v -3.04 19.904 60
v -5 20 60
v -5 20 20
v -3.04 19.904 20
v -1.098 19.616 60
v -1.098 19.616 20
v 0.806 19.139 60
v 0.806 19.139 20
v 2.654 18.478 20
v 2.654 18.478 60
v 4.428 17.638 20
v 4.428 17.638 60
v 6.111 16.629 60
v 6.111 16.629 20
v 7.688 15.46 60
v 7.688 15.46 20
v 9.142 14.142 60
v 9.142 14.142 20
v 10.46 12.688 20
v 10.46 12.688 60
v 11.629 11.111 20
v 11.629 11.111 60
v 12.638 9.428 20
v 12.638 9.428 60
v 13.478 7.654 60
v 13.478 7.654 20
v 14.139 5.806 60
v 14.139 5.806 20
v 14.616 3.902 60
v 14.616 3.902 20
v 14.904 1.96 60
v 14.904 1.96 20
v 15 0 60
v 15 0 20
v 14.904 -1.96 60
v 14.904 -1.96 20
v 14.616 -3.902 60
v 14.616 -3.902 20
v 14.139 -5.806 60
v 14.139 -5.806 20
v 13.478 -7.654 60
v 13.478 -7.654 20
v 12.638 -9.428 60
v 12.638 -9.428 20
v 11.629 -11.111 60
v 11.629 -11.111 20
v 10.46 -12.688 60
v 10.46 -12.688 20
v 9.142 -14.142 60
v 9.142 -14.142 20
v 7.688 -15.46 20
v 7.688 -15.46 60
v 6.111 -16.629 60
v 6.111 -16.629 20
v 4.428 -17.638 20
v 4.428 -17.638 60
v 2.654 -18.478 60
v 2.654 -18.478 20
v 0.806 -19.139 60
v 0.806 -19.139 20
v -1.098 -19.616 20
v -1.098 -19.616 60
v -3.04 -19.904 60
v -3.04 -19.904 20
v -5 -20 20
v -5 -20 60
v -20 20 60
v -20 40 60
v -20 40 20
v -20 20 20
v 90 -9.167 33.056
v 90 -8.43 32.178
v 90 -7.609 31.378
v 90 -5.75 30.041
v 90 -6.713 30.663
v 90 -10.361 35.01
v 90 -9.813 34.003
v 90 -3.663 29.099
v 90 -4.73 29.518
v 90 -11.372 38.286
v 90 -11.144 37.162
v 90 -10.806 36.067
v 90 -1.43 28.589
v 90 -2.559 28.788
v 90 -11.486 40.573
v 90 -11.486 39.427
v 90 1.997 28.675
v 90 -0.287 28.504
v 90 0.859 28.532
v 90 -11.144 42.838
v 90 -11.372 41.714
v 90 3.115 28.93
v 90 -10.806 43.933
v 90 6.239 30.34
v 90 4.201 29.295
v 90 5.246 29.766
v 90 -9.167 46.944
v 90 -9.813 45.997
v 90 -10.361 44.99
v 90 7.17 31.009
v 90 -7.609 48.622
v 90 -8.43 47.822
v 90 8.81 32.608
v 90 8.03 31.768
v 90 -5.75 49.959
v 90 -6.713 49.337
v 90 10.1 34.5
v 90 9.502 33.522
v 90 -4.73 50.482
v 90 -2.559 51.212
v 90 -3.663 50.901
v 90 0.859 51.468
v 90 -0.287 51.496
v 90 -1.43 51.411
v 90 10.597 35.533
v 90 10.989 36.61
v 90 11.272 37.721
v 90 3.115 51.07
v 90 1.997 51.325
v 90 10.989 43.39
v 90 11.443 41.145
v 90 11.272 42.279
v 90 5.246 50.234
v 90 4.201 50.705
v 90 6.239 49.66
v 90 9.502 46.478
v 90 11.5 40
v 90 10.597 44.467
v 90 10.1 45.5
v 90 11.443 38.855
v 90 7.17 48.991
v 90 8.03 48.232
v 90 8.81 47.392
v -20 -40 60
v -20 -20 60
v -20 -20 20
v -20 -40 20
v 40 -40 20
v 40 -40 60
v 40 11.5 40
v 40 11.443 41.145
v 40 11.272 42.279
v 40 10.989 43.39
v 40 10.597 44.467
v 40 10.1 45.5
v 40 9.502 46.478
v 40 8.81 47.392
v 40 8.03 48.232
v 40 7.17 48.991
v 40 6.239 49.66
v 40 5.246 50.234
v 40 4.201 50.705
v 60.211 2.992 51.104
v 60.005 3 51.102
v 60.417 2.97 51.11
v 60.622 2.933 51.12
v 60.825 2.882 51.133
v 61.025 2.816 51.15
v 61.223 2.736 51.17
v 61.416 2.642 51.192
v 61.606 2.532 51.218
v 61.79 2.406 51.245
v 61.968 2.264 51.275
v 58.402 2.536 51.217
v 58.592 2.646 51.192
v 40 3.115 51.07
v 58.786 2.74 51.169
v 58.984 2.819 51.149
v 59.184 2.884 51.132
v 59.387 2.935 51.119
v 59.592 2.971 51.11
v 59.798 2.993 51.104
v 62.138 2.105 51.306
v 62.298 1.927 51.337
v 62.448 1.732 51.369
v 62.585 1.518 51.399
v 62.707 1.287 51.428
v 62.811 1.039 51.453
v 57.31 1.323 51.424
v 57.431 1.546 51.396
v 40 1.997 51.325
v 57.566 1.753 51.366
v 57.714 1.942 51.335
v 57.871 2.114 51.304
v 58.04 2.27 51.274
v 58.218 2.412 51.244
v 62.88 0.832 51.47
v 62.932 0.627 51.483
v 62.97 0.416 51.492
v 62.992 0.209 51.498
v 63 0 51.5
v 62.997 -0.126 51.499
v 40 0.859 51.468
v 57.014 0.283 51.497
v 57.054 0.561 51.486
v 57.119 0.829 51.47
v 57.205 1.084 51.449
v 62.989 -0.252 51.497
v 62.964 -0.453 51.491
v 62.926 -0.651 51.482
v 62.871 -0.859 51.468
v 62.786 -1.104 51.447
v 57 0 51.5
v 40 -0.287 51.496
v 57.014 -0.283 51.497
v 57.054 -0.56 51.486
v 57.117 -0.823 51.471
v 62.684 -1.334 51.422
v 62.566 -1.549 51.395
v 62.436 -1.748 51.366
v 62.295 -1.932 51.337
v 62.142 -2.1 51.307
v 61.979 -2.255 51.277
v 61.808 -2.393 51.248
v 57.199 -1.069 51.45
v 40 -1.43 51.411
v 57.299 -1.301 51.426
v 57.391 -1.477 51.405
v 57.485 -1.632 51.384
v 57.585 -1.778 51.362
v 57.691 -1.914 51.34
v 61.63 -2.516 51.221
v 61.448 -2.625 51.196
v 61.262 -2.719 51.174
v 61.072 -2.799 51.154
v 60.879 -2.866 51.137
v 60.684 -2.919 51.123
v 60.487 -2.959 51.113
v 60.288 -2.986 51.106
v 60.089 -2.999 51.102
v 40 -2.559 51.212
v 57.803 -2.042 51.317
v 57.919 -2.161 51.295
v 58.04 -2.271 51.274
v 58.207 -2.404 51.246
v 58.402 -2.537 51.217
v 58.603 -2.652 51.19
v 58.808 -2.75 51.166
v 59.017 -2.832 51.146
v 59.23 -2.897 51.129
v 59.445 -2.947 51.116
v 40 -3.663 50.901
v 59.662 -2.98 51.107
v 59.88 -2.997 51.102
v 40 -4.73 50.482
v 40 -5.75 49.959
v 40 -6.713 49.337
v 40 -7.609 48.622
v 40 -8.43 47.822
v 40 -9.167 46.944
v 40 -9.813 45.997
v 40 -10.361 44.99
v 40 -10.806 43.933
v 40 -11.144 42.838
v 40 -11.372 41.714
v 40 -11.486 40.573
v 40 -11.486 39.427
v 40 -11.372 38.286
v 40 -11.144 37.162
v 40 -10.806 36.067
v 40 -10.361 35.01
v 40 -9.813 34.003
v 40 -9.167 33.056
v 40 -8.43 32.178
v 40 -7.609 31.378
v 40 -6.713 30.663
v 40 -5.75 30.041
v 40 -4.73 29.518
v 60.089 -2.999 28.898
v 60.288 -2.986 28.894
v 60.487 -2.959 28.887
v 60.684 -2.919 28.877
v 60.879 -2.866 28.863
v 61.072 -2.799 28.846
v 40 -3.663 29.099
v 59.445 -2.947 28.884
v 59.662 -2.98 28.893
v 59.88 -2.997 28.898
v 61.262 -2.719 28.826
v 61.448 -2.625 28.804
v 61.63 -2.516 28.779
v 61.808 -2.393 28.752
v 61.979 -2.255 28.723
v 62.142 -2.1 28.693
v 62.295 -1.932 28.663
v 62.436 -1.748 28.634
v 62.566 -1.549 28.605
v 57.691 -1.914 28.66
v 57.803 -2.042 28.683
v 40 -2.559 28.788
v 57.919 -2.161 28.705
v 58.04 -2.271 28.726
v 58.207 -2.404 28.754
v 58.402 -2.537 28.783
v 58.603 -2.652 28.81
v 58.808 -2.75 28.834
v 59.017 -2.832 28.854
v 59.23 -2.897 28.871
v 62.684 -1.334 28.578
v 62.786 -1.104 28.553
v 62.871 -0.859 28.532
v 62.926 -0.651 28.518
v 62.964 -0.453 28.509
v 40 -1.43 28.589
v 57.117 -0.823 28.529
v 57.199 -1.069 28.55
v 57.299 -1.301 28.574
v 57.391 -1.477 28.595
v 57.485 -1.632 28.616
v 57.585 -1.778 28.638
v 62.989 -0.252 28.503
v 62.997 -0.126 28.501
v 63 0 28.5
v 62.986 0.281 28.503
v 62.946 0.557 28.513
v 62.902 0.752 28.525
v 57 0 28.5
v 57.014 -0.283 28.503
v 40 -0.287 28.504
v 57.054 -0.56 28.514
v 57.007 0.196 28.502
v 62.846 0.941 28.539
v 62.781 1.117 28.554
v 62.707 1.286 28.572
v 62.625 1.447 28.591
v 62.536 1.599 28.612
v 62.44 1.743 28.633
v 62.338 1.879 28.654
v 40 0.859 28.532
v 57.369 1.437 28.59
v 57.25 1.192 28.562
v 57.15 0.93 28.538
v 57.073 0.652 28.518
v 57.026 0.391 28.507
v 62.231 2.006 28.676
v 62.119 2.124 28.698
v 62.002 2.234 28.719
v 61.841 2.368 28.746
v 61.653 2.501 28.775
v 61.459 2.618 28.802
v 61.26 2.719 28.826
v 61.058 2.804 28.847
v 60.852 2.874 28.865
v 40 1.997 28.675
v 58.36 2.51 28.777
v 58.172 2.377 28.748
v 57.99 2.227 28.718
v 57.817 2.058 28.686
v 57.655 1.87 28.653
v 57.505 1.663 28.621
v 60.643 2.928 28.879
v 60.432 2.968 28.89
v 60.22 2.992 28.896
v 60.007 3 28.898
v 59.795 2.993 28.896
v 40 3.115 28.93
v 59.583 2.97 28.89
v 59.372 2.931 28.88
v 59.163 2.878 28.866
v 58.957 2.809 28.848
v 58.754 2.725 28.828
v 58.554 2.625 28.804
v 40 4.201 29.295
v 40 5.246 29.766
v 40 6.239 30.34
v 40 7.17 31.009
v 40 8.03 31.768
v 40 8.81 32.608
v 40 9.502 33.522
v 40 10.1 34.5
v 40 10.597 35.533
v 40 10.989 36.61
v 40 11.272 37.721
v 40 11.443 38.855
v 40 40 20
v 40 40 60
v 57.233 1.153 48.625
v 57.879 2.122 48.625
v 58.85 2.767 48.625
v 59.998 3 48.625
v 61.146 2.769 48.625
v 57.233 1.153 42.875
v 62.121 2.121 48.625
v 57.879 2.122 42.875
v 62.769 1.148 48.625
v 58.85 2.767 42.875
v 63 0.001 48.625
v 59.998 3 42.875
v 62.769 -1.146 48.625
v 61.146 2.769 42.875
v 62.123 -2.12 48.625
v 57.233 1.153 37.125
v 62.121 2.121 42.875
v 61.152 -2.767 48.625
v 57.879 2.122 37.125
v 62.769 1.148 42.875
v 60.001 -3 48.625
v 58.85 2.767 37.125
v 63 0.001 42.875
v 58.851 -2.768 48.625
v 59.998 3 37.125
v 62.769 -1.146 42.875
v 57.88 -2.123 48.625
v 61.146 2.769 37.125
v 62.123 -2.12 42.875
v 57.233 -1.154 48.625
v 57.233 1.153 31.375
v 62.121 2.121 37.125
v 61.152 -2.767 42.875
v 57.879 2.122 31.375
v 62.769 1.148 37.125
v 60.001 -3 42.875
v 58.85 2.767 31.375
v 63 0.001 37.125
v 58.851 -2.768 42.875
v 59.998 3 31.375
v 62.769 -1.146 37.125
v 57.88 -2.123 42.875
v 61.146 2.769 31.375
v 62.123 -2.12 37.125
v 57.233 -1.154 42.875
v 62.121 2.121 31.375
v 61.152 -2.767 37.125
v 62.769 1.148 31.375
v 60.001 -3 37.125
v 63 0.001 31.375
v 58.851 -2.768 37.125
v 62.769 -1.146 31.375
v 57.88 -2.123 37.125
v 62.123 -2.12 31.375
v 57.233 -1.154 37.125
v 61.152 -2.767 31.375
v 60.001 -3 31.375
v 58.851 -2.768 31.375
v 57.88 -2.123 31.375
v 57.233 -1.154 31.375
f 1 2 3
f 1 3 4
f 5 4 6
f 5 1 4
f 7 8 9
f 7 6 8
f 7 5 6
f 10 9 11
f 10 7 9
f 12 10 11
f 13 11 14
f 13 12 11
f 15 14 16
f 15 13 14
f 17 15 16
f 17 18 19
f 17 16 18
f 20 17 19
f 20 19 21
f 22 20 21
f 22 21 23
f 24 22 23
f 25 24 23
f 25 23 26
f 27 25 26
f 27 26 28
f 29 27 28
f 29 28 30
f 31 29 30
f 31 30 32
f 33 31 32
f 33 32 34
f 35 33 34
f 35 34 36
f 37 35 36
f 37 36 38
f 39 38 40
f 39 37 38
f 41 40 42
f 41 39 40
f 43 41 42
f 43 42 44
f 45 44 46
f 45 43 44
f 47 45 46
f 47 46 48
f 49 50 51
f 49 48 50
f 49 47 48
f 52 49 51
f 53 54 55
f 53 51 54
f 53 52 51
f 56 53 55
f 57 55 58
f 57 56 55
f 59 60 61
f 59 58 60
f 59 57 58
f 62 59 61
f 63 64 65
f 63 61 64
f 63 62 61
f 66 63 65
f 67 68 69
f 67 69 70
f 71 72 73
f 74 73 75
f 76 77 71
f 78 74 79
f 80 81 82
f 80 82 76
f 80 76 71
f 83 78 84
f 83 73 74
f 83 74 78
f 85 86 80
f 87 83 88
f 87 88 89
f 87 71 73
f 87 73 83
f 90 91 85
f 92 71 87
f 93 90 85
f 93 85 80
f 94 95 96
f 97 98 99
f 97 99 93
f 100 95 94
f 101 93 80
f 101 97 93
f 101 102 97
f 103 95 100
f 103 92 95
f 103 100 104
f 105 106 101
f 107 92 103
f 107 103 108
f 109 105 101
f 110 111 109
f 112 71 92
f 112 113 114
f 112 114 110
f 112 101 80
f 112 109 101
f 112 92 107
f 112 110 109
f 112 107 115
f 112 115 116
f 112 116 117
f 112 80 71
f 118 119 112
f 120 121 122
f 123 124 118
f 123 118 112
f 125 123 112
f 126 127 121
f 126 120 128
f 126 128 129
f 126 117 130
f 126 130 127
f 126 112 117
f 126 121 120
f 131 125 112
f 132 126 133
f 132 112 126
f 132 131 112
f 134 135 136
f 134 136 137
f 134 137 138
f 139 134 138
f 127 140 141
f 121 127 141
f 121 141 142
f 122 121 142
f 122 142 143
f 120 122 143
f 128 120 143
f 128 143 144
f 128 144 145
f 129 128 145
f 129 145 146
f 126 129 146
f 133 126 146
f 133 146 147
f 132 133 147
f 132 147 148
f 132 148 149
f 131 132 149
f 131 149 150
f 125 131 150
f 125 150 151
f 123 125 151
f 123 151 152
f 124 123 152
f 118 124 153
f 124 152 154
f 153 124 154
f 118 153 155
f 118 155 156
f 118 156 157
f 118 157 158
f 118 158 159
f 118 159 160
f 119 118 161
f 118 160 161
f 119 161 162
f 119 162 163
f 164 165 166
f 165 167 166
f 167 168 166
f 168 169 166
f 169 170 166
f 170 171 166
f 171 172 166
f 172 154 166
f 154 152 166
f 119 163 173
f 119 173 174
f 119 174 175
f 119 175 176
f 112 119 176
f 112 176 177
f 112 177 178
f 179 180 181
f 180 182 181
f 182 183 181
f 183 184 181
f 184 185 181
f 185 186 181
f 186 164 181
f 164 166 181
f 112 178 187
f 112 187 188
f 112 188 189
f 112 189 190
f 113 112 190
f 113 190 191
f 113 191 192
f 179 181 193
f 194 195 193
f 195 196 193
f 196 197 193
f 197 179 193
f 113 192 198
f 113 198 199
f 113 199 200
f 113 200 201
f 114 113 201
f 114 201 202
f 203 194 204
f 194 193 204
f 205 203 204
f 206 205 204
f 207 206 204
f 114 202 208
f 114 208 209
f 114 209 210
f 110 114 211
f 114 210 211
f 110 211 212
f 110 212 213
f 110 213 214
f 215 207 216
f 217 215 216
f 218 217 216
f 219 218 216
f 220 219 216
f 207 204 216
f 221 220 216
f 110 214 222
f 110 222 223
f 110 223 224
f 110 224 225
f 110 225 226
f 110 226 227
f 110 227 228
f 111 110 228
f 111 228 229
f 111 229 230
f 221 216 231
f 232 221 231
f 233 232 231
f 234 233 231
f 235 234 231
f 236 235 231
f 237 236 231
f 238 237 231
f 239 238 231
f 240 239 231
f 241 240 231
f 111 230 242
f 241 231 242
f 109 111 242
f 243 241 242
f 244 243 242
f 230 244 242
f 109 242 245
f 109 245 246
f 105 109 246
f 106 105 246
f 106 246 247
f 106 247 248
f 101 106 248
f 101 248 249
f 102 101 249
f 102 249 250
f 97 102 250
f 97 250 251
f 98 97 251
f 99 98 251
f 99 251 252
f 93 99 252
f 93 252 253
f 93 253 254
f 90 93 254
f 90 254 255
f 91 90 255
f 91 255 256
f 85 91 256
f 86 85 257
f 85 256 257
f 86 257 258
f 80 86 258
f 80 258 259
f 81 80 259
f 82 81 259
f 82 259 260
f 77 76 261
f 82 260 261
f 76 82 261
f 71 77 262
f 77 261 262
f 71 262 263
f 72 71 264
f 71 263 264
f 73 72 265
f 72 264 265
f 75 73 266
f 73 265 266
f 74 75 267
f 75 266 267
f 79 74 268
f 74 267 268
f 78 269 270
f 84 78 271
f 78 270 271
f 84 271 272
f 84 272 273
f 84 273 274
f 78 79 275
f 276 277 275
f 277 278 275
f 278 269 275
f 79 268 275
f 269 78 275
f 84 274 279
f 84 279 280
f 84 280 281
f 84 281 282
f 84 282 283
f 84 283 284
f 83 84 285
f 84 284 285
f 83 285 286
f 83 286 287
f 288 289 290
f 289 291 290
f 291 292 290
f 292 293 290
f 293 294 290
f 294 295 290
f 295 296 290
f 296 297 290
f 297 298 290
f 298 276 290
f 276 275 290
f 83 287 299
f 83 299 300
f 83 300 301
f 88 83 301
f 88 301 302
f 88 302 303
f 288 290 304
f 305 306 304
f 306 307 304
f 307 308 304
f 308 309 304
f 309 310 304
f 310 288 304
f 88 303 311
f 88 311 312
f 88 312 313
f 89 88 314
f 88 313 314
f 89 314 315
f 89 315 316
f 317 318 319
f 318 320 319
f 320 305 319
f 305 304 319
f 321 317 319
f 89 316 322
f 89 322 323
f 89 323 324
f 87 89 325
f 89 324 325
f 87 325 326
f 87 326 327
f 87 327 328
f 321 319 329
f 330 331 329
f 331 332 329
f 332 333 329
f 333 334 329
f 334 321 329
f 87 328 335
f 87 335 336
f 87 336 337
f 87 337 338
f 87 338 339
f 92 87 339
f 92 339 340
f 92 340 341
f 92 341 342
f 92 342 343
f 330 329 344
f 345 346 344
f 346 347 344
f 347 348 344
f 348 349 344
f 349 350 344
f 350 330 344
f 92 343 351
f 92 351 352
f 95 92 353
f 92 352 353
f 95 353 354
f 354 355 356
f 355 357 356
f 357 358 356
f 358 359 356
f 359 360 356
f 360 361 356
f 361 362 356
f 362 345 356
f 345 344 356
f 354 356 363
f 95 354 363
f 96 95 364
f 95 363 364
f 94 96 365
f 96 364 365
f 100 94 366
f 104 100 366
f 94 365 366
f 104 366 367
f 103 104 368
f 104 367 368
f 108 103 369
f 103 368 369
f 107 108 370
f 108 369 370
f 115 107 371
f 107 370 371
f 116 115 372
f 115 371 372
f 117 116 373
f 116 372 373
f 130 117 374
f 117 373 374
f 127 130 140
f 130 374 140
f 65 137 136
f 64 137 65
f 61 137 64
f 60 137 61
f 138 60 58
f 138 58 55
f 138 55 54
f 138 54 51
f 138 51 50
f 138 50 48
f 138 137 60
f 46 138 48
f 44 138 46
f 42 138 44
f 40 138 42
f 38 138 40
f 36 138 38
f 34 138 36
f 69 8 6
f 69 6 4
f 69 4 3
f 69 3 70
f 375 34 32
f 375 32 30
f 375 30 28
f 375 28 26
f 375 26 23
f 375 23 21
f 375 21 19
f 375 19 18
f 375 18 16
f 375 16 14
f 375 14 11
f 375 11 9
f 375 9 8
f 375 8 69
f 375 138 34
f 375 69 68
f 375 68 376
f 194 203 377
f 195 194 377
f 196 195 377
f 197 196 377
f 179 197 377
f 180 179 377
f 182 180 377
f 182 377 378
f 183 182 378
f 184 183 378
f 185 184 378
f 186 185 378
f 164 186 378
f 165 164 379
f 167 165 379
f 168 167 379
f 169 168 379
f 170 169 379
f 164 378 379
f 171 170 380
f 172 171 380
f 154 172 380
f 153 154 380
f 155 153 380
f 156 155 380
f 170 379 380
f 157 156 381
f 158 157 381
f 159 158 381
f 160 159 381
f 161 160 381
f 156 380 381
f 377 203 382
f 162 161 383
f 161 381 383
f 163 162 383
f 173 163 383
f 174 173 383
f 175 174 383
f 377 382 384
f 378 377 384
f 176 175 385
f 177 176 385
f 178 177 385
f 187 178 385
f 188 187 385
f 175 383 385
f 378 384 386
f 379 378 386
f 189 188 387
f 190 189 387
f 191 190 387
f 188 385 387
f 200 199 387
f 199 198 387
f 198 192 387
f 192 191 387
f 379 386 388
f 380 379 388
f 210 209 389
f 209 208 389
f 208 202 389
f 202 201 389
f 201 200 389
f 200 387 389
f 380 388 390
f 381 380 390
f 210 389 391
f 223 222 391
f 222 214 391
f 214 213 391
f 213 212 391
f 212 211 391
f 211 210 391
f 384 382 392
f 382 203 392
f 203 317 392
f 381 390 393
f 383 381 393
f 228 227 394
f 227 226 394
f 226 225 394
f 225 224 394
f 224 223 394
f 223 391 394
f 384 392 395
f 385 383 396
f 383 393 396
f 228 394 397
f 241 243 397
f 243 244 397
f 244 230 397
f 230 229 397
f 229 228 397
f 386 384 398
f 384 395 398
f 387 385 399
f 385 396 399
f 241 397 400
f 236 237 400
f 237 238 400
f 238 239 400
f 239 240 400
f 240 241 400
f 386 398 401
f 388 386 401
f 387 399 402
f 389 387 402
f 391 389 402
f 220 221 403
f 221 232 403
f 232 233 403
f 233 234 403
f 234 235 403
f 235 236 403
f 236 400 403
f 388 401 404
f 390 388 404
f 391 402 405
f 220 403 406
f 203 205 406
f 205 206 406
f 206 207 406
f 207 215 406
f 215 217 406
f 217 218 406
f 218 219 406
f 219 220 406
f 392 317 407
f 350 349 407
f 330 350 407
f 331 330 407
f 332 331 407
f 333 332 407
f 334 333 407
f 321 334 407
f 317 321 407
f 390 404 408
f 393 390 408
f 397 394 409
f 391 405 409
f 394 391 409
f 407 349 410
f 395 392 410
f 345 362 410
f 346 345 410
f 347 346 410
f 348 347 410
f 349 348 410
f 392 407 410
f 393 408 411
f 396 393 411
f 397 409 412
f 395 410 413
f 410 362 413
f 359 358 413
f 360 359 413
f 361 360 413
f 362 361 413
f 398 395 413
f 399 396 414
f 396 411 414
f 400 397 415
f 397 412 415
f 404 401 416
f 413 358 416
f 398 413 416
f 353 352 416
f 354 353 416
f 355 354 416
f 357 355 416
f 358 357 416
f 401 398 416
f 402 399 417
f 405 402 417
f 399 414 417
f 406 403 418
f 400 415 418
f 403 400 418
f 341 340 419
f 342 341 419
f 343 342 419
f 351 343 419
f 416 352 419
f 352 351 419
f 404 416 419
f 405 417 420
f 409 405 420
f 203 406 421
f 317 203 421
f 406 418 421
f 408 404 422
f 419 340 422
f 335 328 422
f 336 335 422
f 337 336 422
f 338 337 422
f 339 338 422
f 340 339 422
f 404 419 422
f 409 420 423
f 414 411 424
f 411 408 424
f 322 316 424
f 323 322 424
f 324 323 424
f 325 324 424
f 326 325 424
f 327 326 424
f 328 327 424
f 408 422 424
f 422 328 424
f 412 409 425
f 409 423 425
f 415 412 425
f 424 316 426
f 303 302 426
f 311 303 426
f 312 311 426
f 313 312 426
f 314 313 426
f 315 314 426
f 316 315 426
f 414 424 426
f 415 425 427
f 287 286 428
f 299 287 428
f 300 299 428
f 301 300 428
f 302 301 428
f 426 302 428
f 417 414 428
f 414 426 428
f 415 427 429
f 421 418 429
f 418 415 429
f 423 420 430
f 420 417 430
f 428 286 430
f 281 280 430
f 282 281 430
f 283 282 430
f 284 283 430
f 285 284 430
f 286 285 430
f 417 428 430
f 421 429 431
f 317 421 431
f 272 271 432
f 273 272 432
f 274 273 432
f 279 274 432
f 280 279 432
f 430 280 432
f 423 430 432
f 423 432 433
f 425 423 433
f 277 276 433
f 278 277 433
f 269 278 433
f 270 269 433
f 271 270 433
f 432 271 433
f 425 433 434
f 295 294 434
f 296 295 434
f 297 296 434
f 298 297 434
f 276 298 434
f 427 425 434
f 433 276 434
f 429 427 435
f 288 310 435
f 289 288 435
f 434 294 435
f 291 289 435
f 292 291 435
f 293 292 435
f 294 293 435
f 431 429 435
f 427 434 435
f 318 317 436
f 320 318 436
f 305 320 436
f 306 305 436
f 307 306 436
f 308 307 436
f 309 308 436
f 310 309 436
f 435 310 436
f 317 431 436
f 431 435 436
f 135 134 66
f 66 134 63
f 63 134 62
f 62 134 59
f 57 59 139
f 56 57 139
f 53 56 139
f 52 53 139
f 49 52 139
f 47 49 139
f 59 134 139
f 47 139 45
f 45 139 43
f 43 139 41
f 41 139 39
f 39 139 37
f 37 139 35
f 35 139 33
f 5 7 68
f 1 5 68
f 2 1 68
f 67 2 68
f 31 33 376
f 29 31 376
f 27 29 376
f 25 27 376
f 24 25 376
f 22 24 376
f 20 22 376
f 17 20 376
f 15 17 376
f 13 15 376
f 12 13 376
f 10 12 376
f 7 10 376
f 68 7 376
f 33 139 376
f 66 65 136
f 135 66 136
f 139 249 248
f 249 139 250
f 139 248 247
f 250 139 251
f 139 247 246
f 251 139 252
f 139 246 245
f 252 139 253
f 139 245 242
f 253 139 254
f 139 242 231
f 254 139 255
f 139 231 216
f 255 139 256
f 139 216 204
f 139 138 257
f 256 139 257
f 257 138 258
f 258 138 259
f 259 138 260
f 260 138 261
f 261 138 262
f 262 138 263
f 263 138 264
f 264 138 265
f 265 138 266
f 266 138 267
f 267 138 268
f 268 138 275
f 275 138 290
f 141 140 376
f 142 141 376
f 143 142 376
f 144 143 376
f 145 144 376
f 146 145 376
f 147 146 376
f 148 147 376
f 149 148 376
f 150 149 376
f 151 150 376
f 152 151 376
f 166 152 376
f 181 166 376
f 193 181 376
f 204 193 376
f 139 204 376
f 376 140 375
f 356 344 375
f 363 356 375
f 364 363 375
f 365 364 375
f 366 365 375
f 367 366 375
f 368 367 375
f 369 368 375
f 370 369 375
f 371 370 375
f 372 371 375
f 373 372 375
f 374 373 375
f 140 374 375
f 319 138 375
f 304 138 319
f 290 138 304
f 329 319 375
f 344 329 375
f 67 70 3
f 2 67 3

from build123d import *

# Parameters (mm, degrees)
CROQUIS1_W              = 80
CROQUIS1_H              = 80
SALIENTE_EXTRUIR1_DEPTH = 80
CROQUIS3_R              = 11.5
SALIENTE_EXTRUIR2_DEPTH = 50
CORTAR_EXTRUIR1_START   = 28.499999898
CORTAR_EXTRUIR1_DEPTH   = 23.000000204
CORTAR_EXTRUIR2_DEPTH   = 80
CORTAR_EXTRUIR3_START   = 40
CROQUIS7_W              = 20
CROQUIS7_H              = 80
CORTAR_EXTRUIR3_DEPTH   = 60


# Read off the part's stored shape, not the designer's step: Cortar-Extruir1
with BuildPart() as part:
    # Croquis1 → Saliente-Extruir1 (new body)
    with BuildSketch(Plane.XY):
        Rectangle(CROQUIS1_W, CROQUIS1_H)
    extrude(amount=SALIENTE_EXTRUIR1_DEPTH)

    # Croquis3 → Saliente-Extruir2 (add)
    with BuildSketch(Plane(origin=(40, 0, 0), x_dir=(0, 0, -1), z_dir=(1, 0, 0))):
        with Locations(Location((-40, 0, 0), (0, 0, 90))):
            Circle(CROQUIS3_R)
    extrude(amount=SALIENTE_EXTRUIR2_DEPTH)

    # Cortar-Extruir1 outline → Cortar-Extruir1 (cut)
    with BuildSketch(Plane.XY.offset(CORTAR_EXTRUIR1_START)):
        with BuildLine():
            add(Edge.make_bspline(
                [(57, 0), (57, 0.79647294), (57.328173799, 1.571048026), (58.430085354, 2.672492311), (59.211671862, 2.999496362), (60.78449026, 3.00050241), (61.565740512, 2.676816215), (62.676579515, 1.566145107), (62.999665754, 0.786423133), (63.000333703, -0.783870942), (62.675691102, -1.566206232), (61.569794846, -2.673587285), (60.79292663, -2.999619771), (59.20995314, -3.000379538), (58.430916235, -2.672841833), (57.329196069, -1.57255006), (57, -0.79647294), (57, 0)],
                knots=[0, 0, 0, 0, 0.125, 0.125, 0.25, 0.25, 0.375, 0.375, 0.5, 0.5, 0.625, 0.625, 0.75, 0.75, 0.875, 0.875, 1, 1, 1, 1], degree=3))
        make_face()
    extrude(amount=CORTAR_EXTRUIR1_DEPTH, mode=Mode.SUBTRACT)

    # Croquis5 → Cortar-Extruir2 (cut)
    with BuildSketch(Plane.XY.offset(80)):
        with BuildLine():
            Line((-20, 40), (-20, 20))
            Line((-20, 20), (-5, 20))
            ThreePointArc((-5, 20), (15, 0), (-5, -20))
            Line((-5, -20), (-20, -20))
            Line((-20, -20), (-20, -40))
            Line((-20, -40), (-40, -40))
            Line((-40, -40), (-40, 40))
            Line((-40, 40), (-20, 40))
        make_face()
    extrude(amount=-CORTAR_EXTRUIR2_DEPTH, mode=Mode.SUBTRACT)

    # Croquis7 → Cortar-Extruir3 (cut)
    with BuildSketch(Plane(origin=(0, 0, 0), x_dir=(0, 0, -1), z_dir=(1, 0, 0)).offset(CORTAR_EXTRUIR3_START)):
        with Locations((-70, 0)):
            Rectangle(CROQUIS7_W, CROQUIS7_H)
        with Locations((-10, 0)):
            Rectangle(CROQUIS7_W, CROQUIS7_H)
    extrude(amount=-CORTAR_EXTRUIR3_DEPTH, mode=Mode.SUBTRACT)


solid = part.part
